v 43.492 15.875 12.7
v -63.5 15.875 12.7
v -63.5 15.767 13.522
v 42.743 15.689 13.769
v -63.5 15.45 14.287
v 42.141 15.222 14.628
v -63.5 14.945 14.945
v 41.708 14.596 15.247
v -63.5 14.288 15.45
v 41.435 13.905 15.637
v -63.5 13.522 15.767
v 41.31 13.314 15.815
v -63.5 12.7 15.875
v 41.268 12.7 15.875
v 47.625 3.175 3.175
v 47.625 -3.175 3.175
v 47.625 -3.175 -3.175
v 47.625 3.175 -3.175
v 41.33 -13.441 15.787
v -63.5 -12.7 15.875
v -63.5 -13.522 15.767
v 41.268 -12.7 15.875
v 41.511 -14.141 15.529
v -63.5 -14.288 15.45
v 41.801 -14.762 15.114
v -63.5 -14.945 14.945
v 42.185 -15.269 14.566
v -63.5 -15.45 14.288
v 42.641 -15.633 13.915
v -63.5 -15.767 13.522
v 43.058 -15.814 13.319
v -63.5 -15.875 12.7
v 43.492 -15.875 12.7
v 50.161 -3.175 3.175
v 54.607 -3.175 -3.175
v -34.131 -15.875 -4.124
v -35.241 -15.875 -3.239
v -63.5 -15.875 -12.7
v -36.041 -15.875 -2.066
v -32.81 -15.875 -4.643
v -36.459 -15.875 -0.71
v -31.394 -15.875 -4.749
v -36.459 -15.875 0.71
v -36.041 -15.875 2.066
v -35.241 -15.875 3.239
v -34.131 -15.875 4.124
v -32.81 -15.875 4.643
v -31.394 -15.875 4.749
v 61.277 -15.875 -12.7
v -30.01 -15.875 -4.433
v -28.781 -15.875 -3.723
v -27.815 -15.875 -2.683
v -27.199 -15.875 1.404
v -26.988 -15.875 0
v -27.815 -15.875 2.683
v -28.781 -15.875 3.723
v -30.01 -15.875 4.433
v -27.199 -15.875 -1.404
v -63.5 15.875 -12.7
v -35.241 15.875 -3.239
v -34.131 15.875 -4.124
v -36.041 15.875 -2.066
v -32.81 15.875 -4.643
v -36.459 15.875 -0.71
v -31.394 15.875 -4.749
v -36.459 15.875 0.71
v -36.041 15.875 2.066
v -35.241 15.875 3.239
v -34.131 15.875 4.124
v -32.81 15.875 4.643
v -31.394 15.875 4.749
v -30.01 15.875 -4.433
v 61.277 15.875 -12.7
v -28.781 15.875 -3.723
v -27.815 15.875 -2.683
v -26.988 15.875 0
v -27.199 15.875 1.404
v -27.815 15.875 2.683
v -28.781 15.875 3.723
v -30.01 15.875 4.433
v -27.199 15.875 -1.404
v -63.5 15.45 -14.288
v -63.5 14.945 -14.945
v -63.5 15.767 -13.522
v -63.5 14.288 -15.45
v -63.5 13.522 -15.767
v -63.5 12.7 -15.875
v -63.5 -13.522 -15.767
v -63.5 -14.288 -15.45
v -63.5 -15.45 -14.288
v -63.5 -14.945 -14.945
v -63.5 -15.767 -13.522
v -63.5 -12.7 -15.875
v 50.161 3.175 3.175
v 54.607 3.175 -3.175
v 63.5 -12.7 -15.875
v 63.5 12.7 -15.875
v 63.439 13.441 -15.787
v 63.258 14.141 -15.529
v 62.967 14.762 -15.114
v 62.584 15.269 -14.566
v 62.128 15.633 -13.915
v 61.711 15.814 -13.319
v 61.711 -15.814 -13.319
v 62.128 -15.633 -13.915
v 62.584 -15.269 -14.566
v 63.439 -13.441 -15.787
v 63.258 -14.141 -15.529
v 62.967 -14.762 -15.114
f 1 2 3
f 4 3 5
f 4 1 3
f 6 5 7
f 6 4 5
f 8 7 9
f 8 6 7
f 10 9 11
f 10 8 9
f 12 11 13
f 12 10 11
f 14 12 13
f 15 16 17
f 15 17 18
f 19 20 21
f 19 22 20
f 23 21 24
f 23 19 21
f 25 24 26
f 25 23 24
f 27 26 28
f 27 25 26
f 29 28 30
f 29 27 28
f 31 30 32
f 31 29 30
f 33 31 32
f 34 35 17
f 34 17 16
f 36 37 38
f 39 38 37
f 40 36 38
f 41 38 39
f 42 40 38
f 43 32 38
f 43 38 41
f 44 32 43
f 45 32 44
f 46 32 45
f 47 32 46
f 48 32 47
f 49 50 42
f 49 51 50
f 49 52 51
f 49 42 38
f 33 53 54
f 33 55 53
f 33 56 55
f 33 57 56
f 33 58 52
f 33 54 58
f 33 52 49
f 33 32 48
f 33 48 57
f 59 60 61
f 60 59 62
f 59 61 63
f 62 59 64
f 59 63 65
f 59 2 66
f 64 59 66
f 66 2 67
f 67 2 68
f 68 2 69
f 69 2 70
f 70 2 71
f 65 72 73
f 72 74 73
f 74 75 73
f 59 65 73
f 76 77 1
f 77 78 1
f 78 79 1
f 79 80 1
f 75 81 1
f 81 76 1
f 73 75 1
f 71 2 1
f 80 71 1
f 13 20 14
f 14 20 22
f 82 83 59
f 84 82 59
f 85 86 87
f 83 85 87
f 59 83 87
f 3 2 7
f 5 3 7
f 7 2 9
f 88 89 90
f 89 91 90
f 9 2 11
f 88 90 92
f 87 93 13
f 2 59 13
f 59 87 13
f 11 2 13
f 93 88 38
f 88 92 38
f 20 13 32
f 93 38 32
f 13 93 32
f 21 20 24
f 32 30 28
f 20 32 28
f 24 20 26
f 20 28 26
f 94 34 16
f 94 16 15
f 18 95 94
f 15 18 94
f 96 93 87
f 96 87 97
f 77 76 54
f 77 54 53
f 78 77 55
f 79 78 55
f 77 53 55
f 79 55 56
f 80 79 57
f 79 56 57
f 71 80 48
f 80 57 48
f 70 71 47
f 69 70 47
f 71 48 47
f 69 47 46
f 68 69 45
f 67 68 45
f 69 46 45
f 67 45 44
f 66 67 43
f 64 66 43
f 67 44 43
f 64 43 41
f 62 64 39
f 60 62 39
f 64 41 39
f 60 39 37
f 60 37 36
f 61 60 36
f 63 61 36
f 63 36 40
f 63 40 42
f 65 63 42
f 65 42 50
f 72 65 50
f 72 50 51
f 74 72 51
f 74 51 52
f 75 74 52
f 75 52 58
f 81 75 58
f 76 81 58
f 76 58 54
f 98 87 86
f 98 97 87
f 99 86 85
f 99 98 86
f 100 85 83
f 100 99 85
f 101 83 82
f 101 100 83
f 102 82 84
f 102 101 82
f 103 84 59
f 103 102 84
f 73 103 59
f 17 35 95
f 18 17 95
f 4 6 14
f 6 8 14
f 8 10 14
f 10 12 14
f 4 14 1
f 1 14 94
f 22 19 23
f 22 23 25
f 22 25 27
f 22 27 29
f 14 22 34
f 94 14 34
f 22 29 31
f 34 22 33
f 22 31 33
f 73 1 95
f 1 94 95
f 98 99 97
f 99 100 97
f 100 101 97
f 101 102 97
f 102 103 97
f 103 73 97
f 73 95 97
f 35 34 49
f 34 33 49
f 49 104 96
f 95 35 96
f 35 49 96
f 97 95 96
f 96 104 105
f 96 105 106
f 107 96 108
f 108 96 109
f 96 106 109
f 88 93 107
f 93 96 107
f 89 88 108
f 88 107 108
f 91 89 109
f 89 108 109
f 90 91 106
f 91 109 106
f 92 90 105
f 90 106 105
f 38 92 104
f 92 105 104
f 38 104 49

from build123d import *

# Parameters (mm, degrees)
F0_W     = 127
F0_H     = 31.75
F1_DEPTH = 15.875
F2_R     = 4.7625
F3_DEPTH = 31.751
F5_DEPTH = 31.751
F7_W     = 6.35
F7_H     = 6.35
F8_DEPTH = 15.875
F9_R     = 3.175


with BuildPart() as f1:
    # F0 (on Front) → F1 (new body, symmetric)
    with BuildSketch(Plane.XZ):
        Rectangle(F0_W, F0_H)
    extrude(amount=F1_DEPTH, both=True)

    # F2 (on face) → F3 (cut, through all)
    with BuildSketch(Plane.XZ.offset(15.875)):
        with Locations((-31.75, 0)):
            Circle(F2_R)
    extrude(amount=-F3_DEPTH, mode=Mode.SUBTRACT)

    # F4 (on face) → F5 (cut, through all)
    with BuildSketch(Plane.XZ.offset(15.875)):
        Polygon((41.2684106618, 15.875), (63.5, -15.875), (63.5, 15.875), align=None)
    extrude(amount=-F5_DEPTH, mode=Mode.SUBTRACT)

    # F7 (on offset) → F8 (cut)
    with BuildSketch(Plane.YZ.offset(63.5)):
        Rectangle(F7_W, F7_H)
    extrude(amount=-F8_DEPTH, mode=Mode.SUBTRACT)

    # F9
    f9_edges = [f1.edges().sort_by_distance(p)[0] for p in [
        (-11.115795, -15.875, 15.875),
        (-11.115795, 15.875, 15.875),
        (0, -15.875, -15.875),
        (0, 15.875, -15.875),
    ]]
    fillet(f9_edges, radius=F9_R)


solid = f1.part
